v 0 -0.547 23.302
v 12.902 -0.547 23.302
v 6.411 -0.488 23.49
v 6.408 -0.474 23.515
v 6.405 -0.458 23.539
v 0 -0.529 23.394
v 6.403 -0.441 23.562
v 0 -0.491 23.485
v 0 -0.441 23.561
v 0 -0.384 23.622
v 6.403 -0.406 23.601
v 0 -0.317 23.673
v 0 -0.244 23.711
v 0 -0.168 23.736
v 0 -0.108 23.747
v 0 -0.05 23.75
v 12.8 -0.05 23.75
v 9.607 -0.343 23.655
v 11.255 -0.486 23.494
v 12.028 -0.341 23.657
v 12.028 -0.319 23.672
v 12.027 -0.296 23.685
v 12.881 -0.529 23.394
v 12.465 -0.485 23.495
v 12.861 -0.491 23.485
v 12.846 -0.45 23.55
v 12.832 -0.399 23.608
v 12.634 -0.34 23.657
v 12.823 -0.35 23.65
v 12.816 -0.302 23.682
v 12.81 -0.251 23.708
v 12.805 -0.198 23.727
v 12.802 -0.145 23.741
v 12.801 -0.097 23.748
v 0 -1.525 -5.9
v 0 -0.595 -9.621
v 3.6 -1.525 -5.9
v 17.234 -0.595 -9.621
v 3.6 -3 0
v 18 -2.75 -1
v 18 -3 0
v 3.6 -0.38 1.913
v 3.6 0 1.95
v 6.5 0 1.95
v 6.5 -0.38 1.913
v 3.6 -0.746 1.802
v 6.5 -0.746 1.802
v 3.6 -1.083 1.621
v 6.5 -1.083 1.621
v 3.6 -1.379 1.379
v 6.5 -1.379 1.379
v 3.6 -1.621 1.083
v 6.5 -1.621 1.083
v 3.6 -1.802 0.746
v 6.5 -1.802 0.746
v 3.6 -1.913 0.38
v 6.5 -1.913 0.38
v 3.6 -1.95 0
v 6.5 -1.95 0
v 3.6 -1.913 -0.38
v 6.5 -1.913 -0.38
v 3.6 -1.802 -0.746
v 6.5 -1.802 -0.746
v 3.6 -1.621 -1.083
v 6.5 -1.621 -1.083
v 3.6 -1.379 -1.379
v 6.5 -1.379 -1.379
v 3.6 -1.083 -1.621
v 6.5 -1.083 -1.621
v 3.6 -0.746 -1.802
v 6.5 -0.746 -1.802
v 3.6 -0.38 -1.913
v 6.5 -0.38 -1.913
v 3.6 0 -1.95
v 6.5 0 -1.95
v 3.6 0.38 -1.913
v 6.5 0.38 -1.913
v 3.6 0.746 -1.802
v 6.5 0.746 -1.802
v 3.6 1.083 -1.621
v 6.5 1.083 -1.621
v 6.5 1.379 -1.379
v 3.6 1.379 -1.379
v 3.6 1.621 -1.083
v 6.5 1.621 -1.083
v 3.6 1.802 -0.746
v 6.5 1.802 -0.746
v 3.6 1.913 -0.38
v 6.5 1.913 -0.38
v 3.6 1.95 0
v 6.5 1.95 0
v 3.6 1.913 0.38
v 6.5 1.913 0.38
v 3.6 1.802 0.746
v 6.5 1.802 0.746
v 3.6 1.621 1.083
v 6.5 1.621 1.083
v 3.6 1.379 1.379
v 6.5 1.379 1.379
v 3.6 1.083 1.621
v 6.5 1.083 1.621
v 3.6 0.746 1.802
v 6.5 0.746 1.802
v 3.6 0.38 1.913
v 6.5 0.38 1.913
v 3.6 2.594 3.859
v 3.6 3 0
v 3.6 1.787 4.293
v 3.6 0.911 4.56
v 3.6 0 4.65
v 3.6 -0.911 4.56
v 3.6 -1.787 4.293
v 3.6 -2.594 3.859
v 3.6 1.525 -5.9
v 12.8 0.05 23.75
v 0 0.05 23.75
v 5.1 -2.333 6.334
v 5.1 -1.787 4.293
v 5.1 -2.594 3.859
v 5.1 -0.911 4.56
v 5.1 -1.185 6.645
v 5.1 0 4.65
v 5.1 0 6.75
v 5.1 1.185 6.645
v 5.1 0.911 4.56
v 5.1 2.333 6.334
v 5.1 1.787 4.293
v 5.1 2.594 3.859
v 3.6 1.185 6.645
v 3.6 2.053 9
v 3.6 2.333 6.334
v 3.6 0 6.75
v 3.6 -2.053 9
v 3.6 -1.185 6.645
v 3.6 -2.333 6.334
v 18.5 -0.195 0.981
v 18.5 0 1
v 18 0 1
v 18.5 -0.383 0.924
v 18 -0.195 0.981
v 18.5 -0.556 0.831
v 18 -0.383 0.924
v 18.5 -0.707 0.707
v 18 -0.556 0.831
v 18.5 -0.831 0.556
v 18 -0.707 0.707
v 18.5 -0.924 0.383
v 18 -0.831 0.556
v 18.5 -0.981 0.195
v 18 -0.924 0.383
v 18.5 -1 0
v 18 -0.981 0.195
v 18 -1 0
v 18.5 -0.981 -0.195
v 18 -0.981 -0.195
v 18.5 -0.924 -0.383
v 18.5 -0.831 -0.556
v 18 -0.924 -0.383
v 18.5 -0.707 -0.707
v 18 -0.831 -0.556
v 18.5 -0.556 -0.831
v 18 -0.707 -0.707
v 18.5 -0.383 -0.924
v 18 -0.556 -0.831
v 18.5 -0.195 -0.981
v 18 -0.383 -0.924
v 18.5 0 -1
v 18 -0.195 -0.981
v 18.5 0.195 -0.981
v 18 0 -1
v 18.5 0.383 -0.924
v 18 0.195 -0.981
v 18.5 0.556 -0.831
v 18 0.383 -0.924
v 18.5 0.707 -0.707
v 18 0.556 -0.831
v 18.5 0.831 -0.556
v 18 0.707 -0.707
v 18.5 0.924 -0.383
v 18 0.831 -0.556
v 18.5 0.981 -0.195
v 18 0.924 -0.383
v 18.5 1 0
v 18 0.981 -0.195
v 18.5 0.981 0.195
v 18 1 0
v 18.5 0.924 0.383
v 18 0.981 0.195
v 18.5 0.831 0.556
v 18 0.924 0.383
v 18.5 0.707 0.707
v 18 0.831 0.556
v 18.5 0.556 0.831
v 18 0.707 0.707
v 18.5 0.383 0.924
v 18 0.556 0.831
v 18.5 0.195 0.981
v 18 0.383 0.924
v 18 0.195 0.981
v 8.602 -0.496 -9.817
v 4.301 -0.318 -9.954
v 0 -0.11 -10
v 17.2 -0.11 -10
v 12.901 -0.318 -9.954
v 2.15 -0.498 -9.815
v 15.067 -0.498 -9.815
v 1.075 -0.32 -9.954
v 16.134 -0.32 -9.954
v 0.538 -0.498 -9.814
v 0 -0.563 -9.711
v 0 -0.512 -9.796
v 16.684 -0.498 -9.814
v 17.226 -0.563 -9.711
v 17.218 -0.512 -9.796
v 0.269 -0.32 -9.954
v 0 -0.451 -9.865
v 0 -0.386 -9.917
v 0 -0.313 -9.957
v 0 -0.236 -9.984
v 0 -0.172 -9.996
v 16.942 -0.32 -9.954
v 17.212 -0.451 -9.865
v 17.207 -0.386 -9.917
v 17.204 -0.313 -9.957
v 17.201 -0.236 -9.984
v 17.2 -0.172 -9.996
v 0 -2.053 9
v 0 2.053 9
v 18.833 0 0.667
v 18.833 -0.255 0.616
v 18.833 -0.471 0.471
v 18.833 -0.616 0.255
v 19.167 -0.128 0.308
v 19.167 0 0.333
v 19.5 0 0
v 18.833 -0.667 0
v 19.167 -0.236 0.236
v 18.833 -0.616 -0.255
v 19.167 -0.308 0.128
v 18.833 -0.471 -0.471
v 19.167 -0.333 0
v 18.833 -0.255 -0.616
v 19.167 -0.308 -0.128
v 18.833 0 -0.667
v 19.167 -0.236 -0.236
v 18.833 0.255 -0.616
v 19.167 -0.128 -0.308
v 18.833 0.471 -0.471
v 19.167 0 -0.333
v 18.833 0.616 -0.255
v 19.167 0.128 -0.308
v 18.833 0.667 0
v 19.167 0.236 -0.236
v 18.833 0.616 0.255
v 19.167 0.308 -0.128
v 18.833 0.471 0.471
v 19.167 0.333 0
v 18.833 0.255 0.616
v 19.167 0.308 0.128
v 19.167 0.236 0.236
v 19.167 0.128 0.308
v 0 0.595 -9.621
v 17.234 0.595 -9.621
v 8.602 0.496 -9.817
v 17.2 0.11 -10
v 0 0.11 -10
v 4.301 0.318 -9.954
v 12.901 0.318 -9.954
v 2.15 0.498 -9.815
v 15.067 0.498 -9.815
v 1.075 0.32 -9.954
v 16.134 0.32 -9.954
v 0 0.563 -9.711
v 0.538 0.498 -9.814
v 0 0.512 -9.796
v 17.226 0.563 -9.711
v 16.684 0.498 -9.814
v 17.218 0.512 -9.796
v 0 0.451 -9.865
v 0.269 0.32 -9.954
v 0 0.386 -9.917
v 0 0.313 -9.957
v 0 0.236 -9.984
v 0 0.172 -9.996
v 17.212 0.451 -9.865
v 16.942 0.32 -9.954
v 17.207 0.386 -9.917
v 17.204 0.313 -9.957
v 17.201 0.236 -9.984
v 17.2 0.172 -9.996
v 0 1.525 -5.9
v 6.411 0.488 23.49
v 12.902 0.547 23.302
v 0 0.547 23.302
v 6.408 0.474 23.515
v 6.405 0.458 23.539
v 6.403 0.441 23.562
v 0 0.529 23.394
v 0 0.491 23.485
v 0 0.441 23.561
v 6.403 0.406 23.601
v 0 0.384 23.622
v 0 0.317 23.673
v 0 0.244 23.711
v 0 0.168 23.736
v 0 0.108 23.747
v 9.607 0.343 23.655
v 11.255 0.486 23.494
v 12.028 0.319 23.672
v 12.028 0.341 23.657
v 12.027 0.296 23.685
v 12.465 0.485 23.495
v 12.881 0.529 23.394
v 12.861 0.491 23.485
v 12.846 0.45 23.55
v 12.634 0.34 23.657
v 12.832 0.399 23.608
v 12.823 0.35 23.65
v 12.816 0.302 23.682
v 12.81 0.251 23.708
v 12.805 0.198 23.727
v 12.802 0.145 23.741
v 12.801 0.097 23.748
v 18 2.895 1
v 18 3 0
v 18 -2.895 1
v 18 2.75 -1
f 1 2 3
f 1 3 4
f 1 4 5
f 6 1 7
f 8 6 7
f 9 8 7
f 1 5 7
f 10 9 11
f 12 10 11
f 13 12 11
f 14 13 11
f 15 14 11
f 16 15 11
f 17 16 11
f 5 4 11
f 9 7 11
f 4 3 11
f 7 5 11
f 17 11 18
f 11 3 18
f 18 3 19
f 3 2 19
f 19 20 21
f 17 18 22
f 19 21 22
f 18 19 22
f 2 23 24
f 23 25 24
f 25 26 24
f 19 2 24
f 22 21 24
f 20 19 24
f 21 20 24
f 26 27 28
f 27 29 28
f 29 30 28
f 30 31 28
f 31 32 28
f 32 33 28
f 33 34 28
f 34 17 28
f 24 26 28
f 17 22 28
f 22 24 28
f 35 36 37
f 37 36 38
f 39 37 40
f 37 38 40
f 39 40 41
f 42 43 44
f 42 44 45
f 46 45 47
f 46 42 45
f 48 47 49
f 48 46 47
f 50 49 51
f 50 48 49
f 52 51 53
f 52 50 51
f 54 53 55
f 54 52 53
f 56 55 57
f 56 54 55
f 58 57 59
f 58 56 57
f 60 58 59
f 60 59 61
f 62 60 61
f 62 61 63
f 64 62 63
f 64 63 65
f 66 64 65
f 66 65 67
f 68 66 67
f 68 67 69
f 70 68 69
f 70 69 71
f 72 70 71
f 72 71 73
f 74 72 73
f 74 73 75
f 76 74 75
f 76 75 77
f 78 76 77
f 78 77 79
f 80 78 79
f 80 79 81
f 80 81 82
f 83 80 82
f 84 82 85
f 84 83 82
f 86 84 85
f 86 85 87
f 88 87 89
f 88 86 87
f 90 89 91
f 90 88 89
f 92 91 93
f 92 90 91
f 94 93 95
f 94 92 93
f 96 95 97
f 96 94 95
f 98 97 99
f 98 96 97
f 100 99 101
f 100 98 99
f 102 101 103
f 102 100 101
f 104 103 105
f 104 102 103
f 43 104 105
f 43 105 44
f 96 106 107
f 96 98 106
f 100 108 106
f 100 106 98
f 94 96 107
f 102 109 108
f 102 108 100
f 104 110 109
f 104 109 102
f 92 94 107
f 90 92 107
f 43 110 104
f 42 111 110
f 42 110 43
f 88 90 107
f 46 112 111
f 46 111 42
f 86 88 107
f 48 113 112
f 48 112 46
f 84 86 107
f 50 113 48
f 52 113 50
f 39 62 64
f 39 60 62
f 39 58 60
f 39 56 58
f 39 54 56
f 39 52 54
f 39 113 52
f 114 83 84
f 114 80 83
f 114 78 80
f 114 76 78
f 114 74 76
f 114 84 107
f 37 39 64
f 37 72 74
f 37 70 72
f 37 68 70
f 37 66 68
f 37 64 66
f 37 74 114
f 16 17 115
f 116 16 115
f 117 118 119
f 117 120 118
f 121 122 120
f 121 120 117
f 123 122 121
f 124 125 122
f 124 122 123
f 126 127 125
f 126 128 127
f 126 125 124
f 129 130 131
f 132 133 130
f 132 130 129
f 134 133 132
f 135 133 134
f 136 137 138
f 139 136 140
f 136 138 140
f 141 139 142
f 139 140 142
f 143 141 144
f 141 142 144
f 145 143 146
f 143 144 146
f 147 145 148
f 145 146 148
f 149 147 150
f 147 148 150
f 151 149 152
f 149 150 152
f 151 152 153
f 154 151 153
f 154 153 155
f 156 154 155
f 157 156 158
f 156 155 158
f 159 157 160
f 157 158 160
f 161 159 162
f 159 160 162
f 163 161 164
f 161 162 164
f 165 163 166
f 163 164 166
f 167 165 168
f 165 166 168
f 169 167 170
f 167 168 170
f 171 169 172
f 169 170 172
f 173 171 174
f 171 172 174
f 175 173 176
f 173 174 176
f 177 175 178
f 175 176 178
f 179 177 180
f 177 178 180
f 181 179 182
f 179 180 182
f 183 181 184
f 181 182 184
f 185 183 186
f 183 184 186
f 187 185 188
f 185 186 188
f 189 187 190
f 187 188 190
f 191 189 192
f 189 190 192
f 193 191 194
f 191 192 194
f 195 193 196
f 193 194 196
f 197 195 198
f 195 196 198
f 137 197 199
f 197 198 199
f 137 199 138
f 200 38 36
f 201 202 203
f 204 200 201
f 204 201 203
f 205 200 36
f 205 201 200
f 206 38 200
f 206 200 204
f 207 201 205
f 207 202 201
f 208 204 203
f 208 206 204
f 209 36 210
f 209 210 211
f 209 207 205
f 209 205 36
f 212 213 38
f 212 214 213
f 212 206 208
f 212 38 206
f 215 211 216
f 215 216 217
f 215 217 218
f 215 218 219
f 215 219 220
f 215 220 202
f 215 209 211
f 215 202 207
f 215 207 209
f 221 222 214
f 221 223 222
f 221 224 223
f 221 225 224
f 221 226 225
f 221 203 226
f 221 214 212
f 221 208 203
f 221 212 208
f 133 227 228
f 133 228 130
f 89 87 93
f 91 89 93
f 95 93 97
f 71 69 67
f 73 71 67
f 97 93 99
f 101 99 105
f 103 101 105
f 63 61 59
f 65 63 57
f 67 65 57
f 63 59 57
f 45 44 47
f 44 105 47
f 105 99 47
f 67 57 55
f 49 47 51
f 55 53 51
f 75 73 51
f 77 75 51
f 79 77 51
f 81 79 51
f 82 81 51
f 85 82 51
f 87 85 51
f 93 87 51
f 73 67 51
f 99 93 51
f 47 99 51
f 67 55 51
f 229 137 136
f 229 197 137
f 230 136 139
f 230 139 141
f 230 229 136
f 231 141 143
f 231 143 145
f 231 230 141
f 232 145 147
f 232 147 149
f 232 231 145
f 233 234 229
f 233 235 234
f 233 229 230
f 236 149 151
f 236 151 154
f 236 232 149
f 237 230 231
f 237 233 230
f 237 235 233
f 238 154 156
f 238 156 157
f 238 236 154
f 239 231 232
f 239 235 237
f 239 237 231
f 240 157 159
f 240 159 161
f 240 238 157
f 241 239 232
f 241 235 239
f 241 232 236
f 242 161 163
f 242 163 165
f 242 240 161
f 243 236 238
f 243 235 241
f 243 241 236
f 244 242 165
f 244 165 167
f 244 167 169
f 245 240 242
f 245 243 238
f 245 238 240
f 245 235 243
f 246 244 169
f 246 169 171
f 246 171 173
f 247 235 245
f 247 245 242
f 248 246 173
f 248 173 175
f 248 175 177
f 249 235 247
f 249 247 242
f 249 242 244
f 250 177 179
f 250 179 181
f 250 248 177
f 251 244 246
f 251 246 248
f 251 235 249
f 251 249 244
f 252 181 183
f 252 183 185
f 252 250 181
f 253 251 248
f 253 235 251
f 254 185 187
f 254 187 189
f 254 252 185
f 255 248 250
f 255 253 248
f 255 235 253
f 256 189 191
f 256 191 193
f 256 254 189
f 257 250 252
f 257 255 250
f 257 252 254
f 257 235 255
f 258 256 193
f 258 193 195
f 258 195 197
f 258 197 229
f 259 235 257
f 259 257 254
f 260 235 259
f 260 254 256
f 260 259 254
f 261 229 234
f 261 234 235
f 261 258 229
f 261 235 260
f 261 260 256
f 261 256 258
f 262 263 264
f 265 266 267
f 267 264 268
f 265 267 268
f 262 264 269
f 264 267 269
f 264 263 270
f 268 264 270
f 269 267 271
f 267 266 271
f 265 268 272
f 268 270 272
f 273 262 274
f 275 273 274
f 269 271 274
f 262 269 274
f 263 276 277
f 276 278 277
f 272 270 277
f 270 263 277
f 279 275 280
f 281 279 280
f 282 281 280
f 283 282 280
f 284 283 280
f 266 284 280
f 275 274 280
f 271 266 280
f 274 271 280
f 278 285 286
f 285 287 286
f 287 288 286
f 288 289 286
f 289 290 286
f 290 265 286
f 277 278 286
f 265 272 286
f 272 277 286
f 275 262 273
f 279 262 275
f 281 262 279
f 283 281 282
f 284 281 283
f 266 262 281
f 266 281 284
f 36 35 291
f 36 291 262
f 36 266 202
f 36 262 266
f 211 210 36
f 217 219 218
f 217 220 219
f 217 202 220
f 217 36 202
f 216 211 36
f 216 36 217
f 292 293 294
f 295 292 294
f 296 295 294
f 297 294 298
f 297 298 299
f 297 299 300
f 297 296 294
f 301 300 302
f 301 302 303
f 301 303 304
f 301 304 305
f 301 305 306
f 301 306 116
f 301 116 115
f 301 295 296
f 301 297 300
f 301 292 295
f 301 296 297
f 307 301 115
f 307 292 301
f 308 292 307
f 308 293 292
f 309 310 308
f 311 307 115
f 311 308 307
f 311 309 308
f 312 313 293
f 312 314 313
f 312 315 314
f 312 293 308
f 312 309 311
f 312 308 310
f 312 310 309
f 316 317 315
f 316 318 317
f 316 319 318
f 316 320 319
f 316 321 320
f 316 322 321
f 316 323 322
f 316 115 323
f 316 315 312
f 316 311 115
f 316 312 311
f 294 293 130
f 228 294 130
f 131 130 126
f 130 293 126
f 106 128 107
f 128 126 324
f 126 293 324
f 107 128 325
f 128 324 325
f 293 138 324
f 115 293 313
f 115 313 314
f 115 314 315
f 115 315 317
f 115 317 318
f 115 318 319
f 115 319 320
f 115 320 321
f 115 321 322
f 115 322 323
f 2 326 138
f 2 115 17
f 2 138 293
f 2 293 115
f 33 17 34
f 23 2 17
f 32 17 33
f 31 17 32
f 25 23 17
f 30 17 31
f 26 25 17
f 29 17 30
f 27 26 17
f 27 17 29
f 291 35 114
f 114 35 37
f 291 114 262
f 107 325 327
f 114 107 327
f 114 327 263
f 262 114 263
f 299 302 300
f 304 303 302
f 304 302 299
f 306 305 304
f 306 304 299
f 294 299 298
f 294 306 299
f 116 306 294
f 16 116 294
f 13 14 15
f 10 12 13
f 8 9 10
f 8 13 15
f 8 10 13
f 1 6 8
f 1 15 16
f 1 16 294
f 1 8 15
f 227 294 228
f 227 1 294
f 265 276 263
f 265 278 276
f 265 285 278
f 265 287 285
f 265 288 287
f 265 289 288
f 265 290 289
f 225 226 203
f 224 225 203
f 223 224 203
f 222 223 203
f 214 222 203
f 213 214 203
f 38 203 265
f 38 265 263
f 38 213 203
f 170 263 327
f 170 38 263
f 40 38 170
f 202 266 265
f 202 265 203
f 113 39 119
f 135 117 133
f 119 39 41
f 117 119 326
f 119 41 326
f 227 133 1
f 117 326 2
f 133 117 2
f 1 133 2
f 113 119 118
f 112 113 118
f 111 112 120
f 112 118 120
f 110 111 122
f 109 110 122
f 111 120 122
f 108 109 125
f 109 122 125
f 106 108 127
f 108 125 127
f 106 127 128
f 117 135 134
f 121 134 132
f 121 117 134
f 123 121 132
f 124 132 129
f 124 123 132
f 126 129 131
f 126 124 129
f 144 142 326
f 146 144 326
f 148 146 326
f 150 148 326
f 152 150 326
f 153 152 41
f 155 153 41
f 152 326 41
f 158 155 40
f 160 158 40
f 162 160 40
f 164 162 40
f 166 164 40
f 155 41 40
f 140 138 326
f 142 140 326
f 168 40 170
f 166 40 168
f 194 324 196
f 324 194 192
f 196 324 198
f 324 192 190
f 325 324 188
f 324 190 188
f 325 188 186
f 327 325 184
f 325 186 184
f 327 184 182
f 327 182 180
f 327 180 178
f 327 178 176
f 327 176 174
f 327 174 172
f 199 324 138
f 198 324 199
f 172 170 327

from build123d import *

# Parameters (mm, degrees)
SKETCH_1_3_R                  = 1.95
CUT_EXTRUDE_1_DEPTH           = 6.5
CUT_EXTRUDE_2_DEPTH           = 30.951001802
CUT_EXTRUDE_2_DEPTH_BACK      = 30.951001802
SKETCH_4_W                    = 3.6
SKETCH_4_H                    = 14.9
SKETCH_5_W                    = 1.5
SKETCH_5_H                    = 2.1
CUT_REVOLVE_1_ANGLE           = 40
CUT_REVOLVE_1_OTHER_WAY_ANGLE = 40
SKETCH_3_3_R                  = 1
EXTRUDE_1_DEPTH               = 1.5
CHAMFER_1_SIZE                = 1
CUT_EXTRUDE_3_DEPTH           = 31.875759187
CUT_EXTRUDE_3_DEPTH_BACK      = 31.875759187
FILLET_1_R                    = 0.5


with BuildPart() as part:
    # Эскиз1 → По сечениям1 section 0
    with BuildSketch(Plane(origin=(0, 0, 0), x_dir=(0, 0, -1), z_dir=(1, 0, 0))):
        with BuildLine():
            Line((-23.75, -0.5), (-23.75, 0.5))
            Line((-23.75, 0.5), (0, 3))
            Line((0, 3), (10, 0.5))
            Line((10, 0.5), (10, -0.5))
            Line((10, -0.5), (0, -3))
            Line((0, -3), (-23.75, -0.5))
        make_face()
    # Эскиз3 → По сечениям1 section 1
    with BuildSketch(Plane(origin=(18, 0, 0), x_dir=(0, 0, -1), z_dir=(1, 0, 0))):
        with BuildLine():
            Line((0, 3), (10, 0.5))
            Line((10, 0.5), (10, -0.5))
            Line((10, -0.5), (0, -3))
            Line((0, -3), (-23.75, -0.5))
            Line((-23.75, -0.5), (-23.75, 0.5))
            Line((-23.75, 0.5), (0, 3))
        make_face()
    loft()

    # Эскиз1<3> → Вырез-Вытянуть1 (cut)
    with BuildSketch(Plane(origin=(0, 0, 0), x_dir=(0, 0, -1), z_dir=(1, 0, 0))):
        with Locations(Location((0, 0, 0), (0, 0, 180))):
            Circle(SKETCH_1_3_R)
    extrude(amount=CUT_EXTRUDE_1_DEPTH, mode=Mode.SUBTRACT)

    # Эскиз4 → Вырез-Вытянуть2 (cut, two sides: drawn at the far end of the back side and taken through both)
    with BuildSketch(Plane(origin=(0, 0, 0), x_dir=(1, 0, 0), z_dir=(0, 1, 0)).offset(-CUT_EXTRUDE_2_DEPTH_BACK)):
        with Locations((1.8, -1.55)):
            Rectangle(SKETCH_4_W, SKETCH_4_H)
    extrude(amount=CUT_EXTRUDE_2_DEPTH + CUT_EXTRUDE_2_DEPTH_BACK, mode=Mode.SUBTRACT)

    # Эскиз5 → Вырез-Повернуть1 (revolve, cut)
    with BuildSketch(Plane(origin=(0, 0, 0), x_dir=(1, 0, 0), z_dir=(0, 1, 0))):
        with Locations((4.35, -5.7)):
            Rectangle(SKETCH_5_W, SKETCH_5_H)
    revolve(axis=Axis((6.5, 0, 0), (-1, 0, 0)), revolution_arc=CUT_REVOLVE_1_ANGLE, mode=Mode.SUBTRACT)

    # Эскиз5 → Вырез-Повернуть1 other way (revolve, cut)
    with BuildSketch(Plane(origin=(0, 0, 0), x_dir=(1, 0, 0), z_dir=(0, 1, 0))):
        with Locations((4.35, -5.7)):
            Rectangle(SKETCH_5_W, SKETCH_5_H)
    revolve(axis=Axis((6.5, 0, 0), (1, 0, 0)), revolution_arc=CUT_REVOLVE_1_OTHER_WAY_ANGLE, mode=Mode.SUBTRACT)

    # Эскиз3<3> → Бобышка-Вытянуть1 (add)
    with BuildSketch(Plane(origin=(18, 0, 0), x_dir=(0, 0, -1), z_dir=(1, 0, 0))):
        with Locations(Location((0, 0, 0), (0, 0, 180))):
            Circle(SKETCH_3_3_R)
    extrude(amount=EXTRUDE_1_DEPTH)

    # Фаска1
    chamfer_1_edges = [part.edges().sort_by_distance(p)[0] for p in [
        (19.5, 0, -1),
    ]]
    chamfer(chamfer_1_edges, length=CHAMFER_1_SIZE)

    # Эскиз6 → Вырез-Вытянуть3 (cut, two sides: drawn at the far end of the back side and taken through both)
    with BuildSketch(Plane(origin=(0, 0, 0), x_dir=(1, 0, 0), z_dir=(0, 1, 0)).offset(-CUT_EXTRUDE_3_DEPTH_BACK)):
        Polygon((18, 10), (17.2, 10), (18, 1), align=None)
        Polygon((12.8, -23.75), (18, -23.75), (18, -1), align=None)
    extrude(amount=CUT_EXTRUDE_3_DEPTH + CUT_EXTRUDE_3_DEPTH_BACK, mode=Mode.SUBTRACT)

    # Скругление1
    fillet_1_edges = [part.edges().sort_by_distance(p)[0] for p in [
        (6.4, 0.5, 23.75),
        (6.4, -0.5, 23.75),
        (8.6, 0.5, -10),
        (8.6, -0.5, -10),
    ]]
    fillet(fillet_1_edges, radius=FILLET_1_R)


solid = part.part
